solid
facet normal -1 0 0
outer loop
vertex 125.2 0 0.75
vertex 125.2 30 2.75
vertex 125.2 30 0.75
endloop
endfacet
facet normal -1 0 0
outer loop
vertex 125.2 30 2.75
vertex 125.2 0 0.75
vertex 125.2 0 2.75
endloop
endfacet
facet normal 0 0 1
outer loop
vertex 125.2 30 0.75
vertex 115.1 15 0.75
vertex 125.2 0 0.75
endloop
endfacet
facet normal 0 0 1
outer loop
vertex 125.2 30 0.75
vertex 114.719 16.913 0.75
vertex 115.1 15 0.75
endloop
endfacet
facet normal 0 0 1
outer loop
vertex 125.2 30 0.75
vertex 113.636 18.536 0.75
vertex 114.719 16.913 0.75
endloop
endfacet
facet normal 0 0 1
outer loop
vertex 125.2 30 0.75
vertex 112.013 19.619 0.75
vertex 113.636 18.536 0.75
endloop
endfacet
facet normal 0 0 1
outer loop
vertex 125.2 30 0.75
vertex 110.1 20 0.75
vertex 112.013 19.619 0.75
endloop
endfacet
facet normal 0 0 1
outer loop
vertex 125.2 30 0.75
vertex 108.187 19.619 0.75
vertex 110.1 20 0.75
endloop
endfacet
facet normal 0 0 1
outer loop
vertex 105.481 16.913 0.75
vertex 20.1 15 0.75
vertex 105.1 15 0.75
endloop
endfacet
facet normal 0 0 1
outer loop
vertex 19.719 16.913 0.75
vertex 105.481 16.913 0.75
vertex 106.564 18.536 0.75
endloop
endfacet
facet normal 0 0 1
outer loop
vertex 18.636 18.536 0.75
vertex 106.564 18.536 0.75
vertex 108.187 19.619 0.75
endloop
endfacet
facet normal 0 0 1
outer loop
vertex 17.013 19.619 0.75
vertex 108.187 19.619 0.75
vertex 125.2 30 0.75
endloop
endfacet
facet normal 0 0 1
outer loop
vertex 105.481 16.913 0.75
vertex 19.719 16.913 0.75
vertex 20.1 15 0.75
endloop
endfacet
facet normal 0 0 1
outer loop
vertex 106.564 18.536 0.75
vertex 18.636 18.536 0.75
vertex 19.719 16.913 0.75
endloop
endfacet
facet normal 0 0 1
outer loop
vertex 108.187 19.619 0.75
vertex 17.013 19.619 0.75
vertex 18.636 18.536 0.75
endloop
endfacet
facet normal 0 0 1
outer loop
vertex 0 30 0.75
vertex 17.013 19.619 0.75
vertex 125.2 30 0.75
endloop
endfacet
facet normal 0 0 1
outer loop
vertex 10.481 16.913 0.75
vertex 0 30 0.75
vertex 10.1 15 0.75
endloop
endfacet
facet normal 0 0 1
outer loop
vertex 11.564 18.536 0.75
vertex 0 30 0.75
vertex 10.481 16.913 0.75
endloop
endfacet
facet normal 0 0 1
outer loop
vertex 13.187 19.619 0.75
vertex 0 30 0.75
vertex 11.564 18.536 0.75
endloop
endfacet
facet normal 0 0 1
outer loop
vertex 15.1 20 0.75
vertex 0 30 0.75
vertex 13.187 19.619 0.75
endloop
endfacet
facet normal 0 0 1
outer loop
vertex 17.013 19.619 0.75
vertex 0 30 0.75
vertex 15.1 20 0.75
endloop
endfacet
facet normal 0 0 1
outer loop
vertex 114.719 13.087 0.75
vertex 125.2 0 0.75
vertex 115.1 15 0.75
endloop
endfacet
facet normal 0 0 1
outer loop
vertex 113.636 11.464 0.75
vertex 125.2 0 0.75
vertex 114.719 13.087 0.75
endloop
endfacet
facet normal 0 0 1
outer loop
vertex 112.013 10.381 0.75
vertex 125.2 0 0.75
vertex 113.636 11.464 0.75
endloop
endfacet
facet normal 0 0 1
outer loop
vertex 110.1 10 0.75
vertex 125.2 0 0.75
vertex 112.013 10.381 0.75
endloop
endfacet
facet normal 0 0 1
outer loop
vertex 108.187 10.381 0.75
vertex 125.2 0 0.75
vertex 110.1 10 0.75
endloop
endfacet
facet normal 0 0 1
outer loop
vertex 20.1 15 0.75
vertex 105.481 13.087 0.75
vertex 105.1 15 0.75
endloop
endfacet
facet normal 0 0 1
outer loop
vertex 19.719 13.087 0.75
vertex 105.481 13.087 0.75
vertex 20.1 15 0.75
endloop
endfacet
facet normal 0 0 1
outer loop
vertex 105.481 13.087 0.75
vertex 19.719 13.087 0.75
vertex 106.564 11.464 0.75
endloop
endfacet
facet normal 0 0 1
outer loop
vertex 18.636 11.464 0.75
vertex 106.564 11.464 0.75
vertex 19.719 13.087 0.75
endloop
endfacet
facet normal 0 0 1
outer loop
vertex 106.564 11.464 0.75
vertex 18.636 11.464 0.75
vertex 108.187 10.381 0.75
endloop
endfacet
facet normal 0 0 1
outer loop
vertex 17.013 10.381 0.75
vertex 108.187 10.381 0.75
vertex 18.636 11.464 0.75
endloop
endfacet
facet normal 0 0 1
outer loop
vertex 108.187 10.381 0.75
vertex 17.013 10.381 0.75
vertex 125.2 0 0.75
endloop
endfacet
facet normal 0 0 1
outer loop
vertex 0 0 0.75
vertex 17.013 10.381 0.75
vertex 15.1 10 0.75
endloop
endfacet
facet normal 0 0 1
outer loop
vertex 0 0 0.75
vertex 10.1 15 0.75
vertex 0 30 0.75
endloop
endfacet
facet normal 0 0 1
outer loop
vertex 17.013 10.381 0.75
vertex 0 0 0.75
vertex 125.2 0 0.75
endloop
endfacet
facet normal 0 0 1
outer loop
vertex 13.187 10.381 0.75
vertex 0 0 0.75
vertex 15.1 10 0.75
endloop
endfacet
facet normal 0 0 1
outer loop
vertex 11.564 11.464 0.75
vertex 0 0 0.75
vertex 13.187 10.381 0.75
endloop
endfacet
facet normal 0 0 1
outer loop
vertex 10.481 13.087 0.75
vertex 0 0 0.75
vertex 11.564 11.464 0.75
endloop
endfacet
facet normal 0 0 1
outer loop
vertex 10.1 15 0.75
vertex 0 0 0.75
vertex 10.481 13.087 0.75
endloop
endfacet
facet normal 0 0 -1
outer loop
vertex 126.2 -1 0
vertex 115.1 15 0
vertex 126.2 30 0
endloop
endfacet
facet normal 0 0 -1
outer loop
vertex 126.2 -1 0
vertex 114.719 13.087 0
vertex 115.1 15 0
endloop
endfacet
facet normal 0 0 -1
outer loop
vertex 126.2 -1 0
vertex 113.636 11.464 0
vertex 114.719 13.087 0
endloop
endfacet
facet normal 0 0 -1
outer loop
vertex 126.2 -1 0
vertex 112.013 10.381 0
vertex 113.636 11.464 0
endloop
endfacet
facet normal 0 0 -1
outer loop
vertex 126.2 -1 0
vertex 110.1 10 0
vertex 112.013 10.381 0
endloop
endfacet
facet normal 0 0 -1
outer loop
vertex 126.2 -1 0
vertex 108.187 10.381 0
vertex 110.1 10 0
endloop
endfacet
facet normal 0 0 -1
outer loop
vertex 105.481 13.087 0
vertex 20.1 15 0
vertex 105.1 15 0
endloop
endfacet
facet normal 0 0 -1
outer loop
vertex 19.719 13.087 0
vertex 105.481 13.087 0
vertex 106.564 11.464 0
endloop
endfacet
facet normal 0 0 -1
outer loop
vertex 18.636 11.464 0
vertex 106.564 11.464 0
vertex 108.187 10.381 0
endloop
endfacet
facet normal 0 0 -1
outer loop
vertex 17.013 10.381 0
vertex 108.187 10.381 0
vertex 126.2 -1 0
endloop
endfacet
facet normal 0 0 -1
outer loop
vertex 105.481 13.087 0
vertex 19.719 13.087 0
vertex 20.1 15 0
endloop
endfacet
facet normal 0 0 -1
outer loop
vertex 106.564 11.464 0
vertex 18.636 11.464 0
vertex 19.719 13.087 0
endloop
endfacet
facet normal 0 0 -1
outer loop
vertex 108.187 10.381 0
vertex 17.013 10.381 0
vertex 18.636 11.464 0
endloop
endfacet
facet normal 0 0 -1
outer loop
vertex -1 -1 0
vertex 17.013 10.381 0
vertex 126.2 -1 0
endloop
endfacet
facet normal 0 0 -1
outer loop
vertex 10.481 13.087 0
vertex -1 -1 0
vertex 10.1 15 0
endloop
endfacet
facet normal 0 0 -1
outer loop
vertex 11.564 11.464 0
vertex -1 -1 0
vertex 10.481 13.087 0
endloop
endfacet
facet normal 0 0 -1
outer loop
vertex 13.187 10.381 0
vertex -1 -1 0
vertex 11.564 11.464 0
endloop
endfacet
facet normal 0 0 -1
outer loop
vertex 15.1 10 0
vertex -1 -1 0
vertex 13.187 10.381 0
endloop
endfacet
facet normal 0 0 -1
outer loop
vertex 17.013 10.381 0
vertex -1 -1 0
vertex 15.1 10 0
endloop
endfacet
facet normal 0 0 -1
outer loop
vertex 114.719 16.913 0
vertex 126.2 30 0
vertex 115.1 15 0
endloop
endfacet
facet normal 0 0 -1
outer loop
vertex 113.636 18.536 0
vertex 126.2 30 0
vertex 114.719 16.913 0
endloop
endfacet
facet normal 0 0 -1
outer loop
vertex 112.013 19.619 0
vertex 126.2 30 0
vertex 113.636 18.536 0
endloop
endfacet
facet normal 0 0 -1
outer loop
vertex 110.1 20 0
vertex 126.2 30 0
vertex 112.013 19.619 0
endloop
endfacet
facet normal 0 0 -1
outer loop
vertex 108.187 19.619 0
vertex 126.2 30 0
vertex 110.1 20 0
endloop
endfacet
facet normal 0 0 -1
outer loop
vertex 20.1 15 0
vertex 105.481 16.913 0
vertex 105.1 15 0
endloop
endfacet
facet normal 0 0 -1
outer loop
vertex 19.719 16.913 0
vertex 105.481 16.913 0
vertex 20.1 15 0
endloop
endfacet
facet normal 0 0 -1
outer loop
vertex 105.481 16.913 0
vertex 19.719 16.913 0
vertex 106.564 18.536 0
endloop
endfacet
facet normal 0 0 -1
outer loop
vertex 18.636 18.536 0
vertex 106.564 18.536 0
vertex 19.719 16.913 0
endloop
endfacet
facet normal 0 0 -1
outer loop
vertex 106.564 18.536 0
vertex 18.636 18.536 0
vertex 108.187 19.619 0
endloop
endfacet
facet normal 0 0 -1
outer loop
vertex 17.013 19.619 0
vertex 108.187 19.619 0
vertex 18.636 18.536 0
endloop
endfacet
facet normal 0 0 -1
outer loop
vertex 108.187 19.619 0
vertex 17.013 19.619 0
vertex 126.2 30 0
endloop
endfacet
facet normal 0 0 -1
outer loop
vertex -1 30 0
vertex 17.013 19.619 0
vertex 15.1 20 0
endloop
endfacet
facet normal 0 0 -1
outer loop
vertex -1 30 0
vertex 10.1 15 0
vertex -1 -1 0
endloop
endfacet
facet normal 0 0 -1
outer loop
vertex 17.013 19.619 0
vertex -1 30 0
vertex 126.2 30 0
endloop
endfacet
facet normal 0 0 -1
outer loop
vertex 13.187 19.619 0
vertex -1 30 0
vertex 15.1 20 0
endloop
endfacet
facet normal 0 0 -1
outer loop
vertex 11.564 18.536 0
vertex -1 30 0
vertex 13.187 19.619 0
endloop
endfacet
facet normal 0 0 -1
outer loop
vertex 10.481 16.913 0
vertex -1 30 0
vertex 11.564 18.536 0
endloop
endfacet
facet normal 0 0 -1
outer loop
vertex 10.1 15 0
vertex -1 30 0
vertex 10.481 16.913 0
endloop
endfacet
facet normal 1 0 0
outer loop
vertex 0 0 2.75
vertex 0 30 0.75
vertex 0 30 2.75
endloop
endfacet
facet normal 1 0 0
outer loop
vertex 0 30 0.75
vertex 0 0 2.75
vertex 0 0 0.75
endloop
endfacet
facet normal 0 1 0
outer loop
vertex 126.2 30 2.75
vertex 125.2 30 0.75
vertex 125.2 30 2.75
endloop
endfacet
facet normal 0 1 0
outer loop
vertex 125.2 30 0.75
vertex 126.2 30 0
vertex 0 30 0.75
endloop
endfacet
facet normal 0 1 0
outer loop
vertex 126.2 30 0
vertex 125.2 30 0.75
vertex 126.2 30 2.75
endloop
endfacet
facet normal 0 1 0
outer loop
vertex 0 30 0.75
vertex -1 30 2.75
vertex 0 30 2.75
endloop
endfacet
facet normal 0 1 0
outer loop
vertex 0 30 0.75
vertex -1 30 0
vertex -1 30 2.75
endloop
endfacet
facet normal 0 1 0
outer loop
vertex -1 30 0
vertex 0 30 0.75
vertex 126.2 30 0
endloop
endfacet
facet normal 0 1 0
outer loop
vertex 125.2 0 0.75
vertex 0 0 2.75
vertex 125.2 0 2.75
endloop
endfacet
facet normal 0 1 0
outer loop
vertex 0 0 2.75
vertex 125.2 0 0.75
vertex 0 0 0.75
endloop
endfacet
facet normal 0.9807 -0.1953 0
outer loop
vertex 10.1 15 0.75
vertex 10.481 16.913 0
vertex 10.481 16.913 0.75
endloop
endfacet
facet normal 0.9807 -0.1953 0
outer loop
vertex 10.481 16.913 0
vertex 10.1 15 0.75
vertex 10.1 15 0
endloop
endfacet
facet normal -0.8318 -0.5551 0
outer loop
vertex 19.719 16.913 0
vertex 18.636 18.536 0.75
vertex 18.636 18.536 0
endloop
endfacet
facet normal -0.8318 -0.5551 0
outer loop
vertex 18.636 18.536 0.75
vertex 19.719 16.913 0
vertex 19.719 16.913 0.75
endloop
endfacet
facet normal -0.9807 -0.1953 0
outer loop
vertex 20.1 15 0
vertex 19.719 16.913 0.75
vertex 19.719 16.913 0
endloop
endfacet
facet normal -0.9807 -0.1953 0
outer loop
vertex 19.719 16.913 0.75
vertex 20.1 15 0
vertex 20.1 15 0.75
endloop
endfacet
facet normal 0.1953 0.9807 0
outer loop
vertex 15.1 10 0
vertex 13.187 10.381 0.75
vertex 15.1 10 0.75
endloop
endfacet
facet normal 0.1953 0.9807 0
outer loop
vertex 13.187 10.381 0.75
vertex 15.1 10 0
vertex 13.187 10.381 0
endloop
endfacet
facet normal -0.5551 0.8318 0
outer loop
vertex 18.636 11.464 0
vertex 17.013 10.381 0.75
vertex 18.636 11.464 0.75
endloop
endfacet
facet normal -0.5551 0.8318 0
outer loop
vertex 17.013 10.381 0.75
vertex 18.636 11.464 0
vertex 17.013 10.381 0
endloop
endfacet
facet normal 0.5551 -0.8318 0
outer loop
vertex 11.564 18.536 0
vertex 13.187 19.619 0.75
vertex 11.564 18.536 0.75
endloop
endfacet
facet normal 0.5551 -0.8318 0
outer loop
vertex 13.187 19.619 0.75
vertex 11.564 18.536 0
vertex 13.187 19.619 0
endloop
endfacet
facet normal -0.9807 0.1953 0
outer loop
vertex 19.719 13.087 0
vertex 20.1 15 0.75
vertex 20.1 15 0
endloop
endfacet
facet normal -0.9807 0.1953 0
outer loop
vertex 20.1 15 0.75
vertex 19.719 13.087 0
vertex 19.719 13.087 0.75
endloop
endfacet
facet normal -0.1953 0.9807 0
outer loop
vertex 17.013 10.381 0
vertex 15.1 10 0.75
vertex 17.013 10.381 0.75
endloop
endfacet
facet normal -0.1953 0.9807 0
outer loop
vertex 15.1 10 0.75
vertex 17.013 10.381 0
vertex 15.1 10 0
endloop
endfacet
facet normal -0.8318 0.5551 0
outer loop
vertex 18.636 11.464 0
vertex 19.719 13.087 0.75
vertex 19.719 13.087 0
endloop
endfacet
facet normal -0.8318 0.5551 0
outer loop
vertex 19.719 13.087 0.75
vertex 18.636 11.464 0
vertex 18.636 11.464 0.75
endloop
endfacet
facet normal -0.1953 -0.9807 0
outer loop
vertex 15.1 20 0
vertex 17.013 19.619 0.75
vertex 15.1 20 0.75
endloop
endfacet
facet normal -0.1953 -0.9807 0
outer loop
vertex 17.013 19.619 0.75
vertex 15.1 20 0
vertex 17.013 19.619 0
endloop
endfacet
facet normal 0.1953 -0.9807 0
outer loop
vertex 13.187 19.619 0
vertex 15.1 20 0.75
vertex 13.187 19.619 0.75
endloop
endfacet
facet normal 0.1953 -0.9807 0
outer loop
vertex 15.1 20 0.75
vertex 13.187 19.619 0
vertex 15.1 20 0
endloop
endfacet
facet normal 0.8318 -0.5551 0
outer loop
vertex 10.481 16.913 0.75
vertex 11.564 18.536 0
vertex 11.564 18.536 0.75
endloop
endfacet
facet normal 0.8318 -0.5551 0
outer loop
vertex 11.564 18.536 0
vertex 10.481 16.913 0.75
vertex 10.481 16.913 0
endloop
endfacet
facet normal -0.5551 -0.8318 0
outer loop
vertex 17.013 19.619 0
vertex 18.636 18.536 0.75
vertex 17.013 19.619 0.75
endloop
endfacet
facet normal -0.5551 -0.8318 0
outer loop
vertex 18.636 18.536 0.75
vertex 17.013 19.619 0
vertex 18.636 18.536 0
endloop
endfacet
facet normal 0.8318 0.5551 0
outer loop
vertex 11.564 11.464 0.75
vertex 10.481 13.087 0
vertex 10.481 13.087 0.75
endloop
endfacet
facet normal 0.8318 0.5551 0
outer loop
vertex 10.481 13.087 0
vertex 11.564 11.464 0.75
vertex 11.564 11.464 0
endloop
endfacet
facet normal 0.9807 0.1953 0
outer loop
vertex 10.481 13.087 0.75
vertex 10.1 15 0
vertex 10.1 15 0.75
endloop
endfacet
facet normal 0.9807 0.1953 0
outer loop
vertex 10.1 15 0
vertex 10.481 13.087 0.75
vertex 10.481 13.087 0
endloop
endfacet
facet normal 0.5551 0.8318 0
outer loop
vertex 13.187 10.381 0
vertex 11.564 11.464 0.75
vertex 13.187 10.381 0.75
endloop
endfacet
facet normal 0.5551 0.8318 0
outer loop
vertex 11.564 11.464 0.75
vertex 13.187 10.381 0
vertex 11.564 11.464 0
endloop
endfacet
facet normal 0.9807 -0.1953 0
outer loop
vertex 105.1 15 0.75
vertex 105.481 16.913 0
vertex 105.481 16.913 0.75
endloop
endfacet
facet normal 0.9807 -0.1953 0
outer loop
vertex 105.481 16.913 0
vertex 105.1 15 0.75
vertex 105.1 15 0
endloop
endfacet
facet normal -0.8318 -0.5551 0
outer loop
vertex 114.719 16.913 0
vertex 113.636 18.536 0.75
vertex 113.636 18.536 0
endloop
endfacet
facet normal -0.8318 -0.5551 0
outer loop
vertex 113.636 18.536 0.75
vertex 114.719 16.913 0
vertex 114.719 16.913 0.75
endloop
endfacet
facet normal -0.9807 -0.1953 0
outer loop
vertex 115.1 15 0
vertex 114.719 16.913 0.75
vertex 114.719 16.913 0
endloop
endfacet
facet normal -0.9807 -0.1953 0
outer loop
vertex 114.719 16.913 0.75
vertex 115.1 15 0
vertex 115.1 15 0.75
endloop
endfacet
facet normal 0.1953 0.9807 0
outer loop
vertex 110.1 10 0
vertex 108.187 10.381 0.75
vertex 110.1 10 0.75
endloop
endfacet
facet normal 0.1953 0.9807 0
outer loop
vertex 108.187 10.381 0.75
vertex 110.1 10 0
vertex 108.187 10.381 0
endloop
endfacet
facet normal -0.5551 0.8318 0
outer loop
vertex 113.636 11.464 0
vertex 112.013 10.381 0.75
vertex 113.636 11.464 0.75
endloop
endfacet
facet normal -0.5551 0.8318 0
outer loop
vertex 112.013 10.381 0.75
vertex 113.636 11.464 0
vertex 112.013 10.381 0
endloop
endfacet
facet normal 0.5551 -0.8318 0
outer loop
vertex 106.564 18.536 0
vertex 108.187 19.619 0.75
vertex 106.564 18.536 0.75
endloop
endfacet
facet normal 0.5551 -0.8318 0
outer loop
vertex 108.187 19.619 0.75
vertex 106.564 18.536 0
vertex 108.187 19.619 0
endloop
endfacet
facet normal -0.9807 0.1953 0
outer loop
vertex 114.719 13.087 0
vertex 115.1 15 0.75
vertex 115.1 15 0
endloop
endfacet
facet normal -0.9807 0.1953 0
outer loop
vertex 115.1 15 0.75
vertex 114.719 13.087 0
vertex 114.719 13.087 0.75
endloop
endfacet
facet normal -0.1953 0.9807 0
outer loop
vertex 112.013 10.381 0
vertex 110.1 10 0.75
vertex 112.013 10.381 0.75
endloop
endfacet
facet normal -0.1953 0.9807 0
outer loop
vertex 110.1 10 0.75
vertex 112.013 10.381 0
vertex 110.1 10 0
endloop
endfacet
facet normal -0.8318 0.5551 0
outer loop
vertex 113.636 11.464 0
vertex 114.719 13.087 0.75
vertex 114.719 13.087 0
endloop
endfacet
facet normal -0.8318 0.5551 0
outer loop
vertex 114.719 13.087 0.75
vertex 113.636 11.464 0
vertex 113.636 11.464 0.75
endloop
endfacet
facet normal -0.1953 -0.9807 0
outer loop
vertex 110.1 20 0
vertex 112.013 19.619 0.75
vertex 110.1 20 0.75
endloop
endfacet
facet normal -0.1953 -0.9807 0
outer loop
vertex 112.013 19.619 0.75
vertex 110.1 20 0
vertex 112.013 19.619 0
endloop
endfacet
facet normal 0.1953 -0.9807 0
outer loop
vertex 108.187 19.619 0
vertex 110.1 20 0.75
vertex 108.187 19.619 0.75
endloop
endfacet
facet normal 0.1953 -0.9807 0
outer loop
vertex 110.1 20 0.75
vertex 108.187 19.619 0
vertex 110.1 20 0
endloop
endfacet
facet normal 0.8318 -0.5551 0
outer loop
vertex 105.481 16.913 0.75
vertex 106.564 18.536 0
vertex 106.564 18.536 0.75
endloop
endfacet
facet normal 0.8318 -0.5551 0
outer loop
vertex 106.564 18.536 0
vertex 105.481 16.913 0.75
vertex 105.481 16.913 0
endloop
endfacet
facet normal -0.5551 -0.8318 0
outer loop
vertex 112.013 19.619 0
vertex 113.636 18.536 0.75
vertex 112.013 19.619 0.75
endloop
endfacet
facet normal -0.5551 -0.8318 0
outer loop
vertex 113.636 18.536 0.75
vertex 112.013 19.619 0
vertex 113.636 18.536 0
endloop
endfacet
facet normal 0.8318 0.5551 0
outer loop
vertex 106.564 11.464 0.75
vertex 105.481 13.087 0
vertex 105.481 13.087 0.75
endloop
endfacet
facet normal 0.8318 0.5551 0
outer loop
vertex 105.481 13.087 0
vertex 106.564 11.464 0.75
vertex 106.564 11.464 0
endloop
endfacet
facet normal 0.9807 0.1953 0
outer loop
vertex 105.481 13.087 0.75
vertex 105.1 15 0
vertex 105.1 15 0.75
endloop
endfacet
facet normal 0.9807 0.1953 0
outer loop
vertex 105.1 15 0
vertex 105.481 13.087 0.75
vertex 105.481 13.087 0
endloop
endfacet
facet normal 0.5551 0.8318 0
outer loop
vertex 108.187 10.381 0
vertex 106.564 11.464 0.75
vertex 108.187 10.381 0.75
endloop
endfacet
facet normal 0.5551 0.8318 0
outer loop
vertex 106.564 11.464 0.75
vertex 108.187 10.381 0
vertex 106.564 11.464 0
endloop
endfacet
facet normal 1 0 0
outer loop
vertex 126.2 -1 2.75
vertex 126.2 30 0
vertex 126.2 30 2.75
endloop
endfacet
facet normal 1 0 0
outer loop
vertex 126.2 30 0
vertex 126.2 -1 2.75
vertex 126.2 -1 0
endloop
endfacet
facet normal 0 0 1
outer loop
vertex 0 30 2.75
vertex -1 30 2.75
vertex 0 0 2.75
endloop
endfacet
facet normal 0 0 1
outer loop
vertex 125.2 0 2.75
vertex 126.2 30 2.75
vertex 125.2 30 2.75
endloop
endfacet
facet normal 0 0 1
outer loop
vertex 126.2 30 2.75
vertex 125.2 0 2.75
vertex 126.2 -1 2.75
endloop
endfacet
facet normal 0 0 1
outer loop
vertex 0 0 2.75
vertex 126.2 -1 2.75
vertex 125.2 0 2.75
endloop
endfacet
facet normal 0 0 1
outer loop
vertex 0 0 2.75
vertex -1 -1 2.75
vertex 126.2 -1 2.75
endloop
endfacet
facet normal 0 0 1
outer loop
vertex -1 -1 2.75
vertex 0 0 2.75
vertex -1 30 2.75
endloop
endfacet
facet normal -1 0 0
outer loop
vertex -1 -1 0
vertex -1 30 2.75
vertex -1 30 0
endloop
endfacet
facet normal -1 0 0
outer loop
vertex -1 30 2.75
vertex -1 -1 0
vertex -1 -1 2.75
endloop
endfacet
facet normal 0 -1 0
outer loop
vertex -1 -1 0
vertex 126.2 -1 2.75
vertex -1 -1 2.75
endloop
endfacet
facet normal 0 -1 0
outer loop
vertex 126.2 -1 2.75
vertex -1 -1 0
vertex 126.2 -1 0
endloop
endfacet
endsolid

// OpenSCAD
x = 125.2;
y = 30;
hole_d = 10;
hole_dist = 95;
h = 0.75;

contour = 1;
contour_h = h+2;


difference() {
cube([x, y, h]);

translate([0.5*(x-hole_dist), 0.5*y, 0]) cylinder(d=hole_d, h=h);
translate([0.5*(x+hole_dist), 0.5*y, 0]) cylinder(d=hole_d, h=h);
    
}


translate([-contour, -contour, 0]) cube([x+2*contour, contour, contour_h]);
translate([-contour, 0, 0]) cube([contour, y, contour_h]);
translate([x, 0, 0]) cube([contour, y, contour_h]);
